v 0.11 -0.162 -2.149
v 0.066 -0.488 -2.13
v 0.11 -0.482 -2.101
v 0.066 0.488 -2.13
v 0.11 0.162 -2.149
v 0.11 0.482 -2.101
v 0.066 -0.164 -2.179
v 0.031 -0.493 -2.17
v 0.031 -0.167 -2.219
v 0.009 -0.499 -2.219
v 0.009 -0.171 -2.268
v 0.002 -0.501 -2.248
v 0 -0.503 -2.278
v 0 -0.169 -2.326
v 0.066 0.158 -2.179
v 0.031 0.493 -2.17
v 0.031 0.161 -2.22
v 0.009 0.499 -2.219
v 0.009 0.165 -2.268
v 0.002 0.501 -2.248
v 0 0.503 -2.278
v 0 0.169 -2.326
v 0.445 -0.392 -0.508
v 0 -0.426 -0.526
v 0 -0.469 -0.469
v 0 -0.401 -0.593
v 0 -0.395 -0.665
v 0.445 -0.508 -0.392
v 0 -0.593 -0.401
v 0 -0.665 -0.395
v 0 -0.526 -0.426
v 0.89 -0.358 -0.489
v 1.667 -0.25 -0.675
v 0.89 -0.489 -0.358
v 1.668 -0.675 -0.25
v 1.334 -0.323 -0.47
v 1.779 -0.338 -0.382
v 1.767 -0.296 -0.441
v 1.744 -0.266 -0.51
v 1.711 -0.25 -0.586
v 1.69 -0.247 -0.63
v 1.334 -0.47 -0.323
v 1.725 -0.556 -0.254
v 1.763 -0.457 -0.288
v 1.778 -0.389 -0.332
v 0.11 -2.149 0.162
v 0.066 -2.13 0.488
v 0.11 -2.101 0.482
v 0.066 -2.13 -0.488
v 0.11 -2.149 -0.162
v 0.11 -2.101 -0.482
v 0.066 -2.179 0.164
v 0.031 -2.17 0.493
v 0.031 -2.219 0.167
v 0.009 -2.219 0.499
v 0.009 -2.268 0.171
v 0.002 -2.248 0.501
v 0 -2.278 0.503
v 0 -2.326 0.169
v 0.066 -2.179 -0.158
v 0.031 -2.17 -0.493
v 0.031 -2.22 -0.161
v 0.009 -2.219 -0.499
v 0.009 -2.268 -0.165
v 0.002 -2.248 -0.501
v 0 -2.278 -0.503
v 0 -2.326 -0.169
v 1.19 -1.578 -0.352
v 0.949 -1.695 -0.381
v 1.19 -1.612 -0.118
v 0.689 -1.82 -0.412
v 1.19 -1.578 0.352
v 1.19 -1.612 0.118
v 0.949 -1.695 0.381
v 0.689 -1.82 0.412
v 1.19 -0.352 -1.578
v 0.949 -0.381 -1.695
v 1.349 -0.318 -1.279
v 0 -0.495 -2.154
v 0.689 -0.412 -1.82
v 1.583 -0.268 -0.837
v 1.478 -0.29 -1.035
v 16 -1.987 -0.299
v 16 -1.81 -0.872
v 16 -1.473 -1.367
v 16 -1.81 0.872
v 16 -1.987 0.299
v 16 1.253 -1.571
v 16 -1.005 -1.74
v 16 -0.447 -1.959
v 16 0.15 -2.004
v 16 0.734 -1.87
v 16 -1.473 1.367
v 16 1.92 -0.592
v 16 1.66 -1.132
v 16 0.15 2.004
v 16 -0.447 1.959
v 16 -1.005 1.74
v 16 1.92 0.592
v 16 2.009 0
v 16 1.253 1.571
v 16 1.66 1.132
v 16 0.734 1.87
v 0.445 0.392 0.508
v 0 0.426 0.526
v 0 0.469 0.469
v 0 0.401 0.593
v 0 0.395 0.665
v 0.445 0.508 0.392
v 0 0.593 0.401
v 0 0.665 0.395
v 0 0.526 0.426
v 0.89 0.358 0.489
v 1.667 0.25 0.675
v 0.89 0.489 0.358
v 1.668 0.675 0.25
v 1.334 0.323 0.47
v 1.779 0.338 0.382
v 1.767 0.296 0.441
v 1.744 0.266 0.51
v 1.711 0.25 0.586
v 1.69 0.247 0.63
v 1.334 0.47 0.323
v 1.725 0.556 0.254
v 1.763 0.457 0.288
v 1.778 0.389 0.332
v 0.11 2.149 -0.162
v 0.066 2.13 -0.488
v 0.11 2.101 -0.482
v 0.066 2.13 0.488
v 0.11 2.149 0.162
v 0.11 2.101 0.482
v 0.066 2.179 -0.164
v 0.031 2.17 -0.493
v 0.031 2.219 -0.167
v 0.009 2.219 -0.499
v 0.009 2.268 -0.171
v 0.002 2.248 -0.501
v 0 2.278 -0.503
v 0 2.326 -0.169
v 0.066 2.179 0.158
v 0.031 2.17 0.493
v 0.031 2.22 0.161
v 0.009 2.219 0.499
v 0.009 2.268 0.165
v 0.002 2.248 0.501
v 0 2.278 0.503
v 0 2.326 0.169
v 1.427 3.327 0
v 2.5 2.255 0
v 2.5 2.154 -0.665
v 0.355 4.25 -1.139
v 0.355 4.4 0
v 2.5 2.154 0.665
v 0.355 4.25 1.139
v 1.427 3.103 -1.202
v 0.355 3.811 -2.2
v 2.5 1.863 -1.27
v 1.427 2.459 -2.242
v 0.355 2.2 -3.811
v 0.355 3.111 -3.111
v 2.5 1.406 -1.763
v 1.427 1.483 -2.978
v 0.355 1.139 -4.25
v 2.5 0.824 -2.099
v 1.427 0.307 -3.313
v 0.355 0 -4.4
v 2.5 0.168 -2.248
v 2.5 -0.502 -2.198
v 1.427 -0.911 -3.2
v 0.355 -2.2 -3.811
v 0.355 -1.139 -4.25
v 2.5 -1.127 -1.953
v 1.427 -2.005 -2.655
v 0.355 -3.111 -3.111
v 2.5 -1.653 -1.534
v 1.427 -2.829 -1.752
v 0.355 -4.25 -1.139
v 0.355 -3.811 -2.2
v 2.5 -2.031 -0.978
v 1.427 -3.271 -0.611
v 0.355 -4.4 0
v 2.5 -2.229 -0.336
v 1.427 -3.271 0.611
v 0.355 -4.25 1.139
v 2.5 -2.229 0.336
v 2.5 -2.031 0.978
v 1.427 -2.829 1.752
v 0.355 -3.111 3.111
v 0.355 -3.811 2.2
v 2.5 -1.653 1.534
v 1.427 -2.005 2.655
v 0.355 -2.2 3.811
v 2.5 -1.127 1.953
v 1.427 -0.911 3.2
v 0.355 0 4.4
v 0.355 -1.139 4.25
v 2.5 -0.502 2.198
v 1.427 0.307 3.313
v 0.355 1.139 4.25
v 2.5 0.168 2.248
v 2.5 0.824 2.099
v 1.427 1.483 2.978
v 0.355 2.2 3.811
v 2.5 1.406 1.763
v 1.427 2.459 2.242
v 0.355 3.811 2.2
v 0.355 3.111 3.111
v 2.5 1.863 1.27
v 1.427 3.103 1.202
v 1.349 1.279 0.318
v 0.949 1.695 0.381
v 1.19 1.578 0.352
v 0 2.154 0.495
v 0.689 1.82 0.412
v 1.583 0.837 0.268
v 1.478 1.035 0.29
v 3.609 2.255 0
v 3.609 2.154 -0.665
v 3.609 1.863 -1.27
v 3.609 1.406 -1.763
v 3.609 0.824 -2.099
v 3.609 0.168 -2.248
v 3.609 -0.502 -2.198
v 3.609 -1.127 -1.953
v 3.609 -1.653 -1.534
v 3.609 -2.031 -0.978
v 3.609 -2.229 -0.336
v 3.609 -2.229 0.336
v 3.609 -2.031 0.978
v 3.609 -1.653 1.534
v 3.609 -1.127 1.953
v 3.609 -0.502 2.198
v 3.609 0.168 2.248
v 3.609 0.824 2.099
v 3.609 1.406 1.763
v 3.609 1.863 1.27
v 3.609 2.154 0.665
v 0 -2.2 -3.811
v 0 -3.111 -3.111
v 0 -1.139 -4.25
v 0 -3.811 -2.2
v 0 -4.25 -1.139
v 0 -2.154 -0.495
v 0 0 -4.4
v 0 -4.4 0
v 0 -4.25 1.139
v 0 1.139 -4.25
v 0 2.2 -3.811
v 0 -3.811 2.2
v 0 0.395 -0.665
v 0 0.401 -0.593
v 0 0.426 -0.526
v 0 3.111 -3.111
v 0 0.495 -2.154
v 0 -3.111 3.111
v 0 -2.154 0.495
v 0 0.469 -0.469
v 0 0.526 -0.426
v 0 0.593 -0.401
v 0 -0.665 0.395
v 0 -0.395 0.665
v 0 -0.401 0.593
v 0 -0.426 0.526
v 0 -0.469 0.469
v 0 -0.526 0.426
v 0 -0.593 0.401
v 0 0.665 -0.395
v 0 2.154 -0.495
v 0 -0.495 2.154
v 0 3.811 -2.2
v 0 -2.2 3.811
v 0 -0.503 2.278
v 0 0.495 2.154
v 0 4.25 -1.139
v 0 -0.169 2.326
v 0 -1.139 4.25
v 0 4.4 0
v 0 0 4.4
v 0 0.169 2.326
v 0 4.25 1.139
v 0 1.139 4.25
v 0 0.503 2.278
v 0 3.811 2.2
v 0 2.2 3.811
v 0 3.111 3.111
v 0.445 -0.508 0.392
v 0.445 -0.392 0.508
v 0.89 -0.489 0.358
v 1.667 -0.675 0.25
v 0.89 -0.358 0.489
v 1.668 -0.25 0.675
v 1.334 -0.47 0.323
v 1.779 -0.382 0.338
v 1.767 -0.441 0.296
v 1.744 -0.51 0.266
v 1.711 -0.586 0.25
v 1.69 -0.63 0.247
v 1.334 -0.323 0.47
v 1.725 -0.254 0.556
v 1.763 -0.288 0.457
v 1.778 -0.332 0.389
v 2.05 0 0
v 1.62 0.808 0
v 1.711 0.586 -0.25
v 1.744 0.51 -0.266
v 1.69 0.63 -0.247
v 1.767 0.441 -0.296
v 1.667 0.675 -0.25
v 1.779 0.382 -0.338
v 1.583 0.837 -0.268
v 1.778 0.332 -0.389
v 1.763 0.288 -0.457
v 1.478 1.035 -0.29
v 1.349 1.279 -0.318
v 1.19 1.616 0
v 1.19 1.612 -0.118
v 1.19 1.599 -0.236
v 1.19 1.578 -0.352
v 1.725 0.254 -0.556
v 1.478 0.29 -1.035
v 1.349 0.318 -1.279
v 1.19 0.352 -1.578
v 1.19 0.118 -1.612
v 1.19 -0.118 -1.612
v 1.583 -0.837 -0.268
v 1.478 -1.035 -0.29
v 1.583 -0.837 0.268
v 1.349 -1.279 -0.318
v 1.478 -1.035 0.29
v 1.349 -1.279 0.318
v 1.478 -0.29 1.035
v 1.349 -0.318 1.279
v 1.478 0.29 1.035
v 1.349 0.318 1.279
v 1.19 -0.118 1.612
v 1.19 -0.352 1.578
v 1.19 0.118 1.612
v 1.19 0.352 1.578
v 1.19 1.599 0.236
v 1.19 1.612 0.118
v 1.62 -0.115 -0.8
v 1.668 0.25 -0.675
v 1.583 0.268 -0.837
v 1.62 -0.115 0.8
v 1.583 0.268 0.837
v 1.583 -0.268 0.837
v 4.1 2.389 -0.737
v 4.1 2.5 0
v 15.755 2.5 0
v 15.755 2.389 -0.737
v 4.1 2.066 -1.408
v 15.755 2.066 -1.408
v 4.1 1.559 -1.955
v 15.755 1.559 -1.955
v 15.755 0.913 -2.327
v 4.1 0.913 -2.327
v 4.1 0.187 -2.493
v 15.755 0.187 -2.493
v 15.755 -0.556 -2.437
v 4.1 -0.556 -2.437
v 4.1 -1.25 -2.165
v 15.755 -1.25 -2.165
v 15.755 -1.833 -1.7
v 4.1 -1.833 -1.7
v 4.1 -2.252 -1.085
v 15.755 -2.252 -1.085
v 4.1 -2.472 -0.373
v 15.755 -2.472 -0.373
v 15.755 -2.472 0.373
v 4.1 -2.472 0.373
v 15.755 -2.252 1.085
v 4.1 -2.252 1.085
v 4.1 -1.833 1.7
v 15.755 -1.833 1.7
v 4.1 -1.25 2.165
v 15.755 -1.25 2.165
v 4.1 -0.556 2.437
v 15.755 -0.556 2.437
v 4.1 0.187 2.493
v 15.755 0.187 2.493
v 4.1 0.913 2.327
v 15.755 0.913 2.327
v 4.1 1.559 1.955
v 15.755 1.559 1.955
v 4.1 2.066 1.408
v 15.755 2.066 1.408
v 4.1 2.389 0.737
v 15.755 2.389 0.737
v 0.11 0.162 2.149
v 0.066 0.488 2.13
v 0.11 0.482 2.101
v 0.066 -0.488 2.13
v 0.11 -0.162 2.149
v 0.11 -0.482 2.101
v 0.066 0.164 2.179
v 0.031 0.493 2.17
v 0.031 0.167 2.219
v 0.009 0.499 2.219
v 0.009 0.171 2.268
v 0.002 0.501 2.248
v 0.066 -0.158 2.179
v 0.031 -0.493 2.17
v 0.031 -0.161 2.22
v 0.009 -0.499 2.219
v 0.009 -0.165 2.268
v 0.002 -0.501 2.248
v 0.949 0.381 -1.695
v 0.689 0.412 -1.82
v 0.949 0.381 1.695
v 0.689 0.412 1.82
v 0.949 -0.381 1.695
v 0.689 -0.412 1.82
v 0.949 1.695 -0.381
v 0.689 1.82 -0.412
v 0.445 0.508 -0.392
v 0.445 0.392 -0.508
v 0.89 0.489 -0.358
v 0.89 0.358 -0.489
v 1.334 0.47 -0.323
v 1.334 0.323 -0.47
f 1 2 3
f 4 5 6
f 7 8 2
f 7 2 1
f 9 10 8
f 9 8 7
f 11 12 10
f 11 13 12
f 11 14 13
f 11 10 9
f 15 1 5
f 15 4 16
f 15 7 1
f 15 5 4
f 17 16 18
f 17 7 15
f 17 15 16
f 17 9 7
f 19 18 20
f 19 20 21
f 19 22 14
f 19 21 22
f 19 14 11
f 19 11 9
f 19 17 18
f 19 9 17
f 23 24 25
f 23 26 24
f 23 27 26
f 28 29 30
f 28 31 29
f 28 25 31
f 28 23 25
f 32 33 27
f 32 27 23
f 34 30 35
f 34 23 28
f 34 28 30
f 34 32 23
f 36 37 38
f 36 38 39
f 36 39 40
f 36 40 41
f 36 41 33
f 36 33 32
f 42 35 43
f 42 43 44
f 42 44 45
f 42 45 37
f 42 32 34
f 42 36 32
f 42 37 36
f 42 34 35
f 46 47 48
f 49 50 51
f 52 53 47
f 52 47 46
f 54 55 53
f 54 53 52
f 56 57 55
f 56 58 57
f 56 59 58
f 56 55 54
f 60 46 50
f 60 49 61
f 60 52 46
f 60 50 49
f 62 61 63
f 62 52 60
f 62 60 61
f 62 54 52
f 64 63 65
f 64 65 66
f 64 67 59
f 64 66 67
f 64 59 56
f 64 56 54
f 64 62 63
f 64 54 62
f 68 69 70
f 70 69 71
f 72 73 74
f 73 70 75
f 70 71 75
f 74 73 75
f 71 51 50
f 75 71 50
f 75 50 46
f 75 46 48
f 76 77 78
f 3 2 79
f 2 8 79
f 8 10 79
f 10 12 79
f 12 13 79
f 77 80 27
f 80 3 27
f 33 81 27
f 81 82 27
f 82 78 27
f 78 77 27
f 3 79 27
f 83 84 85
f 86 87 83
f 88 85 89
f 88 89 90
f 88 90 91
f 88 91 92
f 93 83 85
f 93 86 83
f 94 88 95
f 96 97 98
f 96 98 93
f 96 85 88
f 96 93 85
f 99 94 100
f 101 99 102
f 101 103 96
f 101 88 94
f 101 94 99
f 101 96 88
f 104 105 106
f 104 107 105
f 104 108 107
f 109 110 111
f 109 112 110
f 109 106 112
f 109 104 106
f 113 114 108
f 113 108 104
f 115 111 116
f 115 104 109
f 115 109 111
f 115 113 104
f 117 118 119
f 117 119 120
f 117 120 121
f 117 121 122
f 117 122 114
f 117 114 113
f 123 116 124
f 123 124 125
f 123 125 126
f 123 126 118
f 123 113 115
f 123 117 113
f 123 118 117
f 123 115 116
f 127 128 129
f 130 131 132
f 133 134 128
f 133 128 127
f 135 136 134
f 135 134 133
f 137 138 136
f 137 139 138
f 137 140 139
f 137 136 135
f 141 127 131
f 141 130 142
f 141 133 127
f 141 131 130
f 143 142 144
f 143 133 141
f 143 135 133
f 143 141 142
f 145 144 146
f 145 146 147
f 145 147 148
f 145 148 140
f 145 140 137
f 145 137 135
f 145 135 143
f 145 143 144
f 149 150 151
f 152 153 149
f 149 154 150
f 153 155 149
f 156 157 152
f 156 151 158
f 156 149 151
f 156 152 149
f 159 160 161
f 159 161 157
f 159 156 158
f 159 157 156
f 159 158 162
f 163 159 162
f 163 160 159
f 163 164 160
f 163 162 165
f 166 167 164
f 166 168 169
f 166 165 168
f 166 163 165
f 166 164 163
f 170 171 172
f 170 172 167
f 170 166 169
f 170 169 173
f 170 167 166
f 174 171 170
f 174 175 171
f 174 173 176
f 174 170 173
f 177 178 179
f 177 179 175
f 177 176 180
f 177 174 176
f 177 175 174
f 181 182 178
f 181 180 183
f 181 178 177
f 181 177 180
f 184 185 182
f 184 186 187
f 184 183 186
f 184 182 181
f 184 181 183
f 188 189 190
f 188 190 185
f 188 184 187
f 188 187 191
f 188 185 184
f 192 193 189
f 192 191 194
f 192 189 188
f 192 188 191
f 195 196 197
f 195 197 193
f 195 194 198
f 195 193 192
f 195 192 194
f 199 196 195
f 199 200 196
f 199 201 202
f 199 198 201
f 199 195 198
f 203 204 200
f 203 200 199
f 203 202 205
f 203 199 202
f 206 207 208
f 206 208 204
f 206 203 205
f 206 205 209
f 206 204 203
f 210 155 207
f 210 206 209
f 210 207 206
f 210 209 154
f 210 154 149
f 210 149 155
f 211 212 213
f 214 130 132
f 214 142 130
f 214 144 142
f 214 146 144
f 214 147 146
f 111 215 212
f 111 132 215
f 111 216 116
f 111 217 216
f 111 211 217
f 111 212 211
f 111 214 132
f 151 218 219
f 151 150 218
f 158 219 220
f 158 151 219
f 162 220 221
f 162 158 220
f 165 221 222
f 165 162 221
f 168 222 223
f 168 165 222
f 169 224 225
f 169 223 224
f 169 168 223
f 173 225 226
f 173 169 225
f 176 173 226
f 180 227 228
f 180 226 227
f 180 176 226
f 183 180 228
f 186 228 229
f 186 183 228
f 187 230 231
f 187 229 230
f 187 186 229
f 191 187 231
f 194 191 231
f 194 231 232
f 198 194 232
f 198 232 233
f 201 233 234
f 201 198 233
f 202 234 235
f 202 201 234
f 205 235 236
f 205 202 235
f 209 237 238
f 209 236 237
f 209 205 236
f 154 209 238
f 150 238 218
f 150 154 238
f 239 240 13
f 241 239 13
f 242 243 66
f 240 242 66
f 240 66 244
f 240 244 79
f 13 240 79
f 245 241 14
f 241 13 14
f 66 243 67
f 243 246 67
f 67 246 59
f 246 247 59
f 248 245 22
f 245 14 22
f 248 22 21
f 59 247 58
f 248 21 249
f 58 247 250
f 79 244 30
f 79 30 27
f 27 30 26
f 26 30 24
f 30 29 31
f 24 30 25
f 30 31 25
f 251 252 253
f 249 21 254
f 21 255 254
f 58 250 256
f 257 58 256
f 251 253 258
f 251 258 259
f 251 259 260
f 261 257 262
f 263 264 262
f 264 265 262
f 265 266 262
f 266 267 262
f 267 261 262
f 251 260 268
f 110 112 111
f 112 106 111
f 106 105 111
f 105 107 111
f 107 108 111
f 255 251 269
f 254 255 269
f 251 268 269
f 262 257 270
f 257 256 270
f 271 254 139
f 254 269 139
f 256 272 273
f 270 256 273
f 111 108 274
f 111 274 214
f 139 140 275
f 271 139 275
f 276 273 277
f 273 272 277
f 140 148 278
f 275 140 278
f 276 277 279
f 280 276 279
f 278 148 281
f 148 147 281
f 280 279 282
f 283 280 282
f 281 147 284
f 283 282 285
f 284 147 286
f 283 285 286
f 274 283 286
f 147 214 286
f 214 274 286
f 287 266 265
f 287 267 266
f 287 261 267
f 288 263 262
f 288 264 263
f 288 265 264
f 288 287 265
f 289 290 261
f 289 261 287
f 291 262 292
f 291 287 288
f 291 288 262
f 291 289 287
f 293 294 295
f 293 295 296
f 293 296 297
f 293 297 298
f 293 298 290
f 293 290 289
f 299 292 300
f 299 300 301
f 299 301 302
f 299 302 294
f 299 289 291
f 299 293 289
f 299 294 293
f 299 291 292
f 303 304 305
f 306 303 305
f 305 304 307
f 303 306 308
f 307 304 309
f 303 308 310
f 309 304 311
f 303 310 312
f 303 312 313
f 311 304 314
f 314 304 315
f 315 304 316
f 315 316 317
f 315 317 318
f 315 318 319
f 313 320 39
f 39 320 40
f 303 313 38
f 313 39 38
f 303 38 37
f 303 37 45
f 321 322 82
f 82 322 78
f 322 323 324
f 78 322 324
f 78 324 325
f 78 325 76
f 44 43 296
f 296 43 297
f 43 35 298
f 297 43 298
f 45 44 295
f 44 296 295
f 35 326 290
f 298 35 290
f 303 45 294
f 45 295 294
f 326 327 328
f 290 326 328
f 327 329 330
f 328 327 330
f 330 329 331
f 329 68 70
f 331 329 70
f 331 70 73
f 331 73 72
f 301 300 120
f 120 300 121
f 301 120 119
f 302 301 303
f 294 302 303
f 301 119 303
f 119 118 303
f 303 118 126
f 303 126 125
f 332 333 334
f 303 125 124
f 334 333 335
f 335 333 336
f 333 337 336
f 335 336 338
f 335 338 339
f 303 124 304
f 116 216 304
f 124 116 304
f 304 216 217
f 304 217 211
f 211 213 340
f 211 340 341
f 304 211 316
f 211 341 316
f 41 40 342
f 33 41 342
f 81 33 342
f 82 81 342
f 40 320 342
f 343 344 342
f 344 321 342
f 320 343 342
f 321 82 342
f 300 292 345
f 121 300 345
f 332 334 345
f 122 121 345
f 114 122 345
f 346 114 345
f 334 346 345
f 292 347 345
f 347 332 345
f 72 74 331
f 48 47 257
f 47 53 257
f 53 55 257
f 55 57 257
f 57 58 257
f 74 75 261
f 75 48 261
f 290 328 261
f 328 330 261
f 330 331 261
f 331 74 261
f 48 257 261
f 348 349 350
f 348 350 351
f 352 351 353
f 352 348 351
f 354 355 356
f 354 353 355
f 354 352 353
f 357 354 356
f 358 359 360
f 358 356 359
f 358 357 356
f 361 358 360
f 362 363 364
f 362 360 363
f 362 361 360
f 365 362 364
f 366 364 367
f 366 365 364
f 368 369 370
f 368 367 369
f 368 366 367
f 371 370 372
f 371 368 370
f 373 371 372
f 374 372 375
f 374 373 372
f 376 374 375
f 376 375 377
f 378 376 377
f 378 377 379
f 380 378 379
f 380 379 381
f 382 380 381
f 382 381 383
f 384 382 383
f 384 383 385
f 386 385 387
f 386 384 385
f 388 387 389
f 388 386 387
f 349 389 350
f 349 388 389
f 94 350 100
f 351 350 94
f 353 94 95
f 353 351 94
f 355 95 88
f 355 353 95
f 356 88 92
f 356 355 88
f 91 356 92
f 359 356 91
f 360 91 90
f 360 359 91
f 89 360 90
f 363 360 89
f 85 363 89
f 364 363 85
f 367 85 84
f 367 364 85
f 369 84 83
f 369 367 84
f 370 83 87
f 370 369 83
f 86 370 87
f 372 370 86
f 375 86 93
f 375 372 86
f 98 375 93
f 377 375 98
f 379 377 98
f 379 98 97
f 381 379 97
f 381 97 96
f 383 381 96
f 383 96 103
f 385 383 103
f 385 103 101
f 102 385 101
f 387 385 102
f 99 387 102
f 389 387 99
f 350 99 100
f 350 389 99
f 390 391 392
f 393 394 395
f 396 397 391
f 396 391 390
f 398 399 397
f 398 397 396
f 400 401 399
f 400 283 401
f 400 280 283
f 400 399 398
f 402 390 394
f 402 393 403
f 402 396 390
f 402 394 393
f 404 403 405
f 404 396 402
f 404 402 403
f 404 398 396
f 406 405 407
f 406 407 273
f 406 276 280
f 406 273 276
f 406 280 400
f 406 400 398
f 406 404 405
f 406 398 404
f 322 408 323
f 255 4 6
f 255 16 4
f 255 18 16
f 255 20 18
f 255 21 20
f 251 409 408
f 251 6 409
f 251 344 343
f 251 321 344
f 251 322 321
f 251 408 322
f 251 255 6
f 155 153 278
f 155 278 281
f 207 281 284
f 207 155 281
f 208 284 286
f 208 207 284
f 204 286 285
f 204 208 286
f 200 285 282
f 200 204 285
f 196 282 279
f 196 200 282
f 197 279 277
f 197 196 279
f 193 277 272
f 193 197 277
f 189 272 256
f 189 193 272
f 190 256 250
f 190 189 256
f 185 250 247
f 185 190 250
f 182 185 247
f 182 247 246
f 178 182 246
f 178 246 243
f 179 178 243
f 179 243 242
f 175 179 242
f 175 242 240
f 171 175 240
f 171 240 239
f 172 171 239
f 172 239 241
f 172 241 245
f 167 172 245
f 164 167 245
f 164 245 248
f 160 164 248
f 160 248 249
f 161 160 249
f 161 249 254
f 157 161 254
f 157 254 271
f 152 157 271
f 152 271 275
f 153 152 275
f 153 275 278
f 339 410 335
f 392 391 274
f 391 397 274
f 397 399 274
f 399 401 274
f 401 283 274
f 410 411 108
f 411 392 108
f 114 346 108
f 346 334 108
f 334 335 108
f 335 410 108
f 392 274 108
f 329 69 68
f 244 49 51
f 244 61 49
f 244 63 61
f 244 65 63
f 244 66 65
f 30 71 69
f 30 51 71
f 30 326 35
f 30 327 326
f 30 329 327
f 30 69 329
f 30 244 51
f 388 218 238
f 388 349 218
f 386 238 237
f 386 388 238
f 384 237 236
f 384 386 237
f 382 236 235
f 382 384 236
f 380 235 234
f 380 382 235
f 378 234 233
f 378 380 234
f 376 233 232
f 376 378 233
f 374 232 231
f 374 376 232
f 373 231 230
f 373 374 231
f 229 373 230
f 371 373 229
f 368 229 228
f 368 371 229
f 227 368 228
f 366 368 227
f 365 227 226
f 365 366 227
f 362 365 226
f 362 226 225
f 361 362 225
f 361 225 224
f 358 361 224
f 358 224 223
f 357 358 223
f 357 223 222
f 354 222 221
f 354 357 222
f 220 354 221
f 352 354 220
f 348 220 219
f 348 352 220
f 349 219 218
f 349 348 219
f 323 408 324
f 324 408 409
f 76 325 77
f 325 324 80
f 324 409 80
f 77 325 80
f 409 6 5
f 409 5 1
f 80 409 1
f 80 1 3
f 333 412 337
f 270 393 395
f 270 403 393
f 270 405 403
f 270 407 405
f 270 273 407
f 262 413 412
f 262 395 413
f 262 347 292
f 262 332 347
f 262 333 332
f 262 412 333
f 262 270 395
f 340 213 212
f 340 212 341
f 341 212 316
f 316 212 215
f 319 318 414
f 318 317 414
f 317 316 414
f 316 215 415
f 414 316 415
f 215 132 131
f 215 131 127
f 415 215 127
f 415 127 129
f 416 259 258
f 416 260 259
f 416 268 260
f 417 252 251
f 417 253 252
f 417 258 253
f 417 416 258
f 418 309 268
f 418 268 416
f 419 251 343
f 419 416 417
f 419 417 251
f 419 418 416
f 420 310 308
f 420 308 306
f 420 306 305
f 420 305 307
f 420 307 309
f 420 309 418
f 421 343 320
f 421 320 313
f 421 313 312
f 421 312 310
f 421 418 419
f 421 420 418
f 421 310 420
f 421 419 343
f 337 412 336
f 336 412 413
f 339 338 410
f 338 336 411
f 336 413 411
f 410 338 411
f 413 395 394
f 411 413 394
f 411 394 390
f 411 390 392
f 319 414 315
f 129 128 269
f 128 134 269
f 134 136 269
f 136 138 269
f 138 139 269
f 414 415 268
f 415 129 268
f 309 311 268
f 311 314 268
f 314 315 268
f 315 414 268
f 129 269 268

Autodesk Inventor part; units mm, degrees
ref_plane "YZ Plane" through (0, 0, 0) normal (1, 0, 0) x (0, 1, 0)
ref_plane "XZ Plane" through (0, 0, 0) normal (0, 1, 0) x (-1, 0, 0)
sketch "Sketch1" plane through (0, 0, 0) normal (0, 0, 1) x (1, 0, 0)
  line L0 (2.05, 0) -> (16, 0)
  line L1 (16, 0) -> (16, 2.5)
  line L2 (16, 2.5) -> (4.1, 2.5)
  line L3 (4.1, 2.5) -> (3.6092, 2.2546)
  line L4 (3.6092, 2.2546) -> (2.5, 2.2546)
  line L5 (0, 4.4) -> (0, 2.21)
  line L6 (0, 2.21) -> (1.1905, 1.6164)
  line L7 (1.1905, 1.6164) -> (2.05, 0)
  line L8 (-3.2, 0) -> (19.2, 0) projected
  line L9 (0, -0.88) -> (0, 5.28) projected
  line L10 (0, 4.4) -> (0.3546, 4.4)
  line L11 (0.3546, 4.4) -> (2.5, 2.2546)
  line L12 (4.1, 2.5) -> (2.2546, 2.5) construction
  dimension "d1" = 11.9
  dimension "d2" = 5
  dimension "d3" = 4.5092
  dimension "d4" = 4.42
  dimension "d5" = 26.5
  dimension "d6" = 62
  dimension "d7" = 2.05
  dimension "d8" = 0.4908
  dimension "d12" = 8.8
  dimension "d13" = 45
  dimension "d15" = 16
  dimension "d24" = 2.5
revolve "Body" add sketch "Sketch1" angle 360 about axis through (2.05, 0, 0) along (1, 0, 0) contours L7 L6 L5 L10 L11 L4 L3 L2 L1 L0
sketch "Sketch2" plane through (0, 0, 0) normal (-1, 0, 0) x (0, 0, 1)
  line L0 (0, 2.21) -> (0, 0) construction
  line L1 (0, 0) -> (2.21, 0) construction
  arc A0 (0.663, 0) -> (0, 0.663) centre (0, 0) ccw construction
  arc A1 (0.7735, 0) -> (0, 0.7735) centre (0, 0) ccw construction
  arc A2 (2.1539, 0.495) -> (0.495, 2.1539) centre (0, 0) ccw
  line L2 (0, 0) -> (1.5627, 1.5627) construction
  line L3 (0.495, 2.1539) -> (0.3952, 0.6649)
  line L4 (2.1539, 0.495) -> (0.6649, 0.3952)
  arc A3 (0.495, 2.1539) -> (0, 2.21) centre (0, 0) ccw
  arc A4 (2.21, 0) -> (2.1539, 0.495) centre (0, 0) ccw
  line L5 (0, -6.16) -> (0, 6.16) projected
  line L6 (-6.16, 0) -> (6.16, 0) projected
  arc A5 (0.495, -2.1539) -> (2.1539, -0.495) centre (0, 0) ccw
  line L7 (0.495, -2.1539) -> (0.3952, -0.6649)
  line L8 (2.1539, -0.495) -> (0.6649, -0.3952)
  arc A6 (0, -2.21) -> (0.495, -2.1539) centre (0, 0) ccw
  arc A7 (2.1539, -0.495) -> (2.21, 0) centre (0, 0) ccw
  arc A8 (-0.495, 2.1539) -> (-2.1539, 0.495) centre (0, 0) ccw
  line L9 (-0.495, 2.1539) -> (-0.3952, 0.6649)
  line L10 (-2.1539, 0.495) -> (-0.6649, 0.3952)
  arc A9 (0, 2.21) -> (-0.495, 2.1539) centre (0, 0) ccw
  arc A10 (-2.1539, 0.495) -> (-2.21, 0) centre (0, 0) ccw
  arc A11 (-0.495, -2.1539) -> (0, -2.21) centre (0, 0) ccw
  arc A12 (-2.1539, -0.495) -> (-0.495, -2.1539) centre (0, 0) ccw
  arc A13 (-2.21, 0) -> (-2.1539, -0.495) centre (0, 0) ccw
  line L11 (-2.1539, -0.495) -> (-0.6649, -0.3952)
  line L12 (-0.495, -2.1539) -> (-0.3952, -0.6649)
  arc A14 (0.3952, 0.6649) -> (0.6649, 0.3952) centre (0.648, 0.648) ccw
  arc A15 (0.6649, -0.3952) -> (0.3952, -0.6649) centre (0.648, -0.648) ccw
  arc A16 (-0.6649, 0.3952) -> (-0.3952, 0.6649) centre (-0.648, 0.648) ccw
  arc A17 (-0.3952, -0.6649) -> (-0.6649, -0.3952) centre (-0.648, -0.648) ccw
  point P0 (1.5627, -1.5627)
  point P1 (-1.5627, 1.5627)
  point P2 (-1.5627, -1.5627)
  dimension "d17" = 1.326
  dimension "d18" = 1.547
  dimension "d19" = 4.42
  dimension "d20" = 45
  dimension "d21" = 0.495
extrude "Slot" add sketch "Sketch2" against normal up to next draft 5 contours L4 A14 L3 A2 | A5 L7 A15 L8 | L9 A16 L10 A8 | A12 L11 A17 L12
fillet "Fillet1" radius 0.198 4 edges at (0, 2.21, 0) (0, 0, -2.21) (0, -2.21, 0) (0, 0, 2.21)
thread "Thread" size "M5x0.8" class "6g" standard "ISO Metric profile" length 11.9
chamfer "Chamfer1" distance 0.4908 distance2 0.2454 1 edges at (16, -2.5, 0) measured on face at (16, 0.2278, 0.5045)
ref_plane "Work Plane2" through (3.35, 0, 0) normal (0, 0, -1) x (1, 0, 0)
equation "\"d1\" = GEL"
equation "\"d2\" = GD"
equation "\"d3\" = BDM"
equation "\"d4\" = SDM"
equation "\"d7\" = INTI"
equation "\"d8\" = GAL"
equation "\"d12\" = KOD"
equation "\"d13\" = 0.5 * SEWI"
equation "\"d15\" = NLG"
equation "\"d24\" = KOH"
equation "\"d17\" = 0.3 * SDM"
equation "\"d18\" = 0.35 * SDM"
equation "\"d19\" = SDM"
equation "\"d21\" = 0.5 * SBR"
equation "\"d23\" = 0.2 * SBR"
equation "\"d10\" = GEL"
equation "\"d25\" = -0.5 * SPD + 0.5 * GD"
equation "\"d26\" = 0.5 * GAL"
equation "\"NLG\" = 16"
equation "\"GEL\" = 11.9"
equation "\"GAL\" = 0.61345 * PTC"
equation "\"SPD\" = NND - 1.2269 * PTC"
equation "\"KOD\" = 8.8"
equation "\"KOH\" = 2.5"
equation "\"SBR\" = 0.99"
equation "\"INTI\" = 2.05"
equation "\"SDM\" = 4.42"
equation "\"GD\" = NND"
equation "\"BDM\" = NND - GAL"
equation "\"SEWI\" = 90deg"
equation "\"d9\" = SDM"
equation "\"GUL\" = 0.61345 * PTC"
equation "\"TOA\" = 30deg"
equation "\"EPV\" = 5"
equation "\"THREADDIA\" = 5"
equation "\"RR\" = 0.5"
equation "\"PTC\" = 0.8"
equation "\"NND\" = 5"
equation "\"GD1\" = THREADDIA - 1.2269 * PTC"
properties part number "AS 1427 - M5 x 16" material "Steel, Mild"
